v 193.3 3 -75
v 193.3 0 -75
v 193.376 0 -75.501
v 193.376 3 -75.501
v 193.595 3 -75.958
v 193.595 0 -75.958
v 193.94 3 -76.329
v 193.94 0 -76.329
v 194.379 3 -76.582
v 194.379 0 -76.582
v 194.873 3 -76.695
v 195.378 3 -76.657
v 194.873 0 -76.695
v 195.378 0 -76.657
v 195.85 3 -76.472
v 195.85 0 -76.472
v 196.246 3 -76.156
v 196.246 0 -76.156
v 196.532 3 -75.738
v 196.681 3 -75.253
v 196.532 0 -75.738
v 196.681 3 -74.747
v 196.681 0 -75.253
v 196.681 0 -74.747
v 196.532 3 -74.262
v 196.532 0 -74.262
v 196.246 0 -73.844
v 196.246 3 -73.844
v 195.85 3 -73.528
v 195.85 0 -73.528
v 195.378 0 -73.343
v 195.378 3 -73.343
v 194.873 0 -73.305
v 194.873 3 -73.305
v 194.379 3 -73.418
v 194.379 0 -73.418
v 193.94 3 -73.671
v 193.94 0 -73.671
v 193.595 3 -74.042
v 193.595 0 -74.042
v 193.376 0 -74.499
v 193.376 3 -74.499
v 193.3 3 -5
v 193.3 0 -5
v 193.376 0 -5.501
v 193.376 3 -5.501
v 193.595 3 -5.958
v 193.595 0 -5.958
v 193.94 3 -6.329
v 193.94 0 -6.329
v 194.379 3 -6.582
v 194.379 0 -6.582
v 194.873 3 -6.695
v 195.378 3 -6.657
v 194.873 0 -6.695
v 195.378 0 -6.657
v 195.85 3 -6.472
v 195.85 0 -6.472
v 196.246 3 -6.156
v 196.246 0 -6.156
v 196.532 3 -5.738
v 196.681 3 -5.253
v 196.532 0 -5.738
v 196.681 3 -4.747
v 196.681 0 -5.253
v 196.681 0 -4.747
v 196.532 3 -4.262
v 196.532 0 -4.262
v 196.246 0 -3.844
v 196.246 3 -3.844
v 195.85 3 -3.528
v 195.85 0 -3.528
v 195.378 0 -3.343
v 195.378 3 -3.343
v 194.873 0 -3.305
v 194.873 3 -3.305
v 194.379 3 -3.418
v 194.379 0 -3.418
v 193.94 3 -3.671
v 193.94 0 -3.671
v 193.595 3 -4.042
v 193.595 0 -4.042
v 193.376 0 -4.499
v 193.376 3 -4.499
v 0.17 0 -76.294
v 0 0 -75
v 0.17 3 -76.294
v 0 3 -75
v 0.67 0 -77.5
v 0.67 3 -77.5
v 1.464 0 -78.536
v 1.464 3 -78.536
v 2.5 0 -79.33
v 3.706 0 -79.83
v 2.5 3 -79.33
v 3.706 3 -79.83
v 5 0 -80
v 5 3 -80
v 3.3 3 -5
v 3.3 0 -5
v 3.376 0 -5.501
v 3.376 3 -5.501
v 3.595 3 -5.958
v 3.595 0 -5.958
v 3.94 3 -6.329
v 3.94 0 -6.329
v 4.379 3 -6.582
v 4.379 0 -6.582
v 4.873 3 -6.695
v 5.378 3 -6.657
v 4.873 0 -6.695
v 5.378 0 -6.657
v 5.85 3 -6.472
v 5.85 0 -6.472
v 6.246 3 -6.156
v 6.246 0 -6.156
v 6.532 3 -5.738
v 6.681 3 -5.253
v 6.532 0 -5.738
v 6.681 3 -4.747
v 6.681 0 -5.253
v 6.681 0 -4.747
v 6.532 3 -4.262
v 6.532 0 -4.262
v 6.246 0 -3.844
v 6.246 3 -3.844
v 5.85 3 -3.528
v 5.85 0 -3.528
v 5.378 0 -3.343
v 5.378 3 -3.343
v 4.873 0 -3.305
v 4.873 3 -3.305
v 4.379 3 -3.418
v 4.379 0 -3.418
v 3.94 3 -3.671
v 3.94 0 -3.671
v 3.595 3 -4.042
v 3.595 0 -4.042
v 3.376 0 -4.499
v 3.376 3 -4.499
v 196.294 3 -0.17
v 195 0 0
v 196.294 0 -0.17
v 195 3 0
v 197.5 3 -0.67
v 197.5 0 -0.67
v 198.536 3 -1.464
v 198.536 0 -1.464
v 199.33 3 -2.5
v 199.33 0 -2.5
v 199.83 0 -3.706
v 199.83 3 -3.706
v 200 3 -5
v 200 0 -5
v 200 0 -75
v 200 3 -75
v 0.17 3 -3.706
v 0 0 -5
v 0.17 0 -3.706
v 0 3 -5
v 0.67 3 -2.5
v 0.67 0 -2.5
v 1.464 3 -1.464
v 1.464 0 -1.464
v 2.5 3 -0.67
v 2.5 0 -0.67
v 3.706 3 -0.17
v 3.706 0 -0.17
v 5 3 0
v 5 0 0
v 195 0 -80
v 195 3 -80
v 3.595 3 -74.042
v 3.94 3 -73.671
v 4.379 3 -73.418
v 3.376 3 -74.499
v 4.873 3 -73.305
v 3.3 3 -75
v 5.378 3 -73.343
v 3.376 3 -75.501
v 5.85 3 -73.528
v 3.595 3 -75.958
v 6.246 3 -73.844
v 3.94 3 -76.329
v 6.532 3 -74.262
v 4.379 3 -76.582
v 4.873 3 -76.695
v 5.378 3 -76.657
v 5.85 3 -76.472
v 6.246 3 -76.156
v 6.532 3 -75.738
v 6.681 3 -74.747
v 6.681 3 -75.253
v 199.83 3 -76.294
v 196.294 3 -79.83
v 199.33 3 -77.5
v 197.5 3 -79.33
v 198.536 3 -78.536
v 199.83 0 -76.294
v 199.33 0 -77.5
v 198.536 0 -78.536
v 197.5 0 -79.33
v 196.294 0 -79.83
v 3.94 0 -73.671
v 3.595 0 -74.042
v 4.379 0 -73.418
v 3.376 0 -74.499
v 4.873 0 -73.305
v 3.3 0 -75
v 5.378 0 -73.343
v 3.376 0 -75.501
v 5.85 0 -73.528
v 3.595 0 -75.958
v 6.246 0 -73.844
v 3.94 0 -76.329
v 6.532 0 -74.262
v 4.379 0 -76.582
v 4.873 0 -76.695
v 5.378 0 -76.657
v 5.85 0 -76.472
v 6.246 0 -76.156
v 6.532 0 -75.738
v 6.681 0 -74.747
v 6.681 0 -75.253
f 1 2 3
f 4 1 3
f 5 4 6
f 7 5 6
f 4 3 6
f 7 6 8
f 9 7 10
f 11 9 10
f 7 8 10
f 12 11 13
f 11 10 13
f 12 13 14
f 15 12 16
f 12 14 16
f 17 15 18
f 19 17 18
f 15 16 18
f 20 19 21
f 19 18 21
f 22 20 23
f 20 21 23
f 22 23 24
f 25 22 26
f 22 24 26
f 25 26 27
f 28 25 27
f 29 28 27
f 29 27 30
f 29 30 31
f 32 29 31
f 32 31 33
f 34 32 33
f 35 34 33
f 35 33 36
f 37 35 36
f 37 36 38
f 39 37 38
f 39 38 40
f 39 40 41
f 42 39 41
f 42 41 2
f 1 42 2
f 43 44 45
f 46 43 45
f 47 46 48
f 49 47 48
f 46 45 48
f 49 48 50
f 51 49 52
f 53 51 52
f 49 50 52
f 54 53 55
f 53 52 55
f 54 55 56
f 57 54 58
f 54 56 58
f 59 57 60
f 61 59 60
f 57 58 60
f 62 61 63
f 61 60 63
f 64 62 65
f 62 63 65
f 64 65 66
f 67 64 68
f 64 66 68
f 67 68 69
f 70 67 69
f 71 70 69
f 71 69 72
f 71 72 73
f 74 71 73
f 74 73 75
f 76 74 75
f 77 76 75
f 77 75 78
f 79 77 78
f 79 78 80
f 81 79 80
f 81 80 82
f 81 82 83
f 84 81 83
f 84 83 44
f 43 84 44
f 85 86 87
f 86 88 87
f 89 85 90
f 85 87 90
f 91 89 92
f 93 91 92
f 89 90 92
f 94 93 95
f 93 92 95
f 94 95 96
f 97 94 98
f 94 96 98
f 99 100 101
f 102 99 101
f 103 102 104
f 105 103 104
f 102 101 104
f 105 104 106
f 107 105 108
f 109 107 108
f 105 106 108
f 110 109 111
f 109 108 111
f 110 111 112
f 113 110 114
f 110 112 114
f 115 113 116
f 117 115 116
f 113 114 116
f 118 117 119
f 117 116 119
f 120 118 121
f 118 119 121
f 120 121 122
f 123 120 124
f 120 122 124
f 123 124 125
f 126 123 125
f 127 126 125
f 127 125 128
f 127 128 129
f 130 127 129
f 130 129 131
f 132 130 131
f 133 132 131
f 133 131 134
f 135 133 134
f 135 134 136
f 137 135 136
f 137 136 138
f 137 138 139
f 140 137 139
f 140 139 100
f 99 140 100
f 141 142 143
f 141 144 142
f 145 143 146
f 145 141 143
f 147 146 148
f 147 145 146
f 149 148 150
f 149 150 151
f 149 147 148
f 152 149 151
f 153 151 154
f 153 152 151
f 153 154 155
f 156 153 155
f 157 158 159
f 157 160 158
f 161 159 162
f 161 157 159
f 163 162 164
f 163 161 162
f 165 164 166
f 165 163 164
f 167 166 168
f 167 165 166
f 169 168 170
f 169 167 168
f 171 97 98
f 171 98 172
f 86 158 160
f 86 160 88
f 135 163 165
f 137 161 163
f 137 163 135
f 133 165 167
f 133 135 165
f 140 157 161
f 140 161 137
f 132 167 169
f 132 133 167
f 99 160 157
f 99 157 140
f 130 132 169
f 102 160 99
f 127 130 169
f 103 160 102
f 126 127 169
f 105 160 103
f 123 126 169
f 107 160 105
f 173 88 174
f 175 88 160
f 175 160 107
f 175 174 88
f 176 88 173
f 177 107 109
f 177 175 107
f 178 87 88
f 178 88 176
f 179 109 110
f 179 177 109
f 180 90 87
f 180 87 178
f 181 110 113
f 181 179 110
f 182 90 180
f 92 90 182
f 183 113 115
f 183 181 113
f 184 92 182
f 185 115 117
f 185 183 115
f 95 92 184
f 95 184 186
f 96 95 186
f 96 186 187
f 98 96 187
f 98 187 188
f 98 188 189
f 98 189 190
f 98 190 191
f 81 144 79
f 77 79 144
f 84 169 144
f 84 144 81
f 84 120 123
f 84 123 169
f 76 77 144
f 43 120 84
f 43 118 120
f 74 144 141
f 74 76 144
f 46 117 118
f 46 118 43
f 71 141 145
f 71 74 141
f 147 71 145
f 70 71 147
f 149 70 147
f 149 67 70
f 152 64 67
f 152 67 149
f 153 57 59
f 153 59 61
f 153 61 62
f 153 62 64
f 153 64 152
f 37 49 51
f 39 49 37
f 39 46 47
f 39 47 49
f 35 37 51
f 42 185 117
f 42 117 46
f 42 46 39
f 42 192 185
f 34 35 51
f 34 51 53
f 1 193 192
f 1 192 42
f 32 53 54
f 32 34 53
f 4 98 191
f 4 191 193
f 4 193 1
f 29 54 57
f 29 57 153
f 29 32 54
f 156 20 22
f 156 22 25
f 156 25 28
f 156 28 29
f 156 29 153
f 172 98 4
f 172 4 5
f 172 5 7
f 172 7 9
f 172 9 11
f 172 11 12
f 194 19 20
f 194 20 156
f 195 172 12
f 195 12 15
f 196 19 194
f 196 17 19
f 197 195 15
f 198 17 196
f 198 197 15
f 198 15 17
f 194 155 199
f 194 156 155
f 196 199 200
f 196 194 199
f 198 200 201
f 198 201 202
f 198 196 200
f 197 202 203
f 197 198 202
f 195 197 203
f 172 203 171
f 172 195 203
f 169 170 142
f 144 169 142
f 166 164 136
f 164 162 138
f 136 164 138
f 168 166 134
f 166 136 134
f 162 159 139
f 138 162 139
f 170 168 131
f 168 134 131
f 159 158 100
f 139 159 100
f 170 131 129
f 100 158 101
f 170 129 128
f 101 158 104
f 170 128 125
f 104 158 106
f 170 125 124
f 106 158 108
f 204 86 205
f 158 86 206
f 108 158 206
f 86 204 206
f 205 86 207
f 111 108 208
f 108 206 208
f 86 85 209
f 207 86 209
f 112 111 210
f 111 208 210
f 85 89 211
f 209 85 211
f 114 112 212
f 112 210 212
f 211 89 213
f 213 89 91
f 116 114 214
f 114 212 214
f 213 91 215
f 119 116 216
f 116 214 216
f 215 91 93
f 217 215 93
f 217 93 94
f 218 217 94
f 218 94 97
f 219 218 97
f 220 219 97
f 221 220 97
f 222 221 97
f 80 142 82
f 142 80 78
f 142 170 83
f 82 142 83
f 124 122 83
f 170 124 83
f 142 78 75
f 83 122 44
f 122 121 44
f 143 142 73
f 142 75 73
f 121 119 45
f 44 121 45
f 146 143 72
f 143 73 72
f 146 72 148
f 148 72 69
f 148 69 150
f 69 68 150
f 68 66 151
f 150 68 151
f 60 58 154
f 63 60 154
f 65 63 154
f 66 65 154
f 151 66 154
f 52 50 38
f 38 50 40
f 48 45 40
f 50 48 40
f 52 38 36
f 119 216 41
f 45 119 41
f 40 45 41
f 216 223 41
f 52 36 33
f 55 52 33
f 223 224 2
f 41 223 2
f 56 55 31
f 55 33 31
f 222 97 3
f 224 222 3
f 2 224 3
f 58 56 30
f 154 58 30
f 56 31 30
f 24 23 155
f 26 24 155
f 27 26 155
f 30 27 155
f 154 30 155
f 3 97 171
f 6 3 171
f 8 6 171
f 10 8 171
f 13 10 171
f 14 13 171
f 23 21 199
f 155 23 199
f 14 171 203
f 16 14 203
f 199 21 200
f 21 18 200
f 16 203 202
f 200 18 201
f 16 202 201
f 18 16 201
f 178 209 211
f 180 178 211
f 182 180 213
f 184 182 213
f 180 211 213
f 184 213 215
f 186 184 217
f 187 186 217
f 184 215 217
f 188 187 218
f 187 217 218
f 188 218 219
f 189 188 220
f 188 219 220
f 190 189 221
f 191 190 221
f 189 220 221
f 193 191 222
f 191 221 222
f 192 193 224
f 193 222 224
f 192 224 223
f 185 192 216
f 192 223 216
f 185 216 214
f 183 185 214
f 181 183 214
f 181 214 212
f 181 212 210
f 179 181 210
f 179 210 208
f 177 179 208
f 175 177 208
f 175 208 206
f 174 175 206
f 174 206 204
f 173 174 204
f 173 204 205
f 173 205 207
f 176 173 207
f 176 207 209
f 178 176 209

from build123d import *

# Parameters (mm, degrees)
ESQUISSE1_W             = 200
ESQUISSE1_H             = 80
BOSS_EXTRU_1_DEPTH      = 3
CONG_1_R                = 5
ESQUISSE2_R             = 1
ENL_V_MAT_EXTRU_1_DEPTH = 216.427481998
D_GAGEMENT_M31_D        = 3.4
D_GAGEMENT_M31_DEPTH    = 10
D_GAGEMENT_M31_TIP      = 1.021463052


with BuildPart() as part:
    # Esquisse1 → Boss.-Extru.1 (new body)
    with BuildSketch(Plane(origin=(0, 0, 0), x_dir=(1, 0, 0), z_dir=(0, 1, 0))):
        with Locations((100, 40)):
            Rectangle(ESQUISSE1_W, ESQUISSE1_H)
    extrude(amount=BOSS_EXTRU_1_DEPTH)

    # Congé1
    cong_1_edges = [part.edges().sort_by_distance(p)[0] for p in [
        (0, 1.5, -80),
        (200, 1.5, -80),
        (200, 1.5, 0),
        (0, 1.5, 0),
    ]]
    fillet(cong_1_edges, radius=CONG_1_R)

    # Esquisse2 → Enlèv. mat.-Extru.1 (cut, through all)
    with BuildSketch(Plane(origin=(0, 3, 0), x_dir=(1, 0, 0), z_dir=(0, 1, 0))):
        with Locations(Location((5, 75, 0), (0, 0, 270))):
            Circle(ESQUISSE2_R)
        with Locations(Location((195, 75, 0), (0, 0, 270))):
            Circle(ESQUISSE2_R)
        with Locations(Location((195, 5, 0), (0, 0, 270))):
            Circle(ESQUISSE2_R)
        with Locations(Location((5, 5, 0), (0, 0, 270))):
            Circle(ESQUISSE2_R)
    extrude(amount=-ENL_V_MAT_EXTRU_1_DEPTH, mode=Mode.SUBTRACT)

    # Dégagement M31
    with Locations(Plane(origin=(0, 3, 0), x_dir=(1, 0, 0), z_dir=(0, 1, 0))):
        with Locations((195, 5), (5, 5), (5, 75), (195, 75)):
            Hole(D_GAGEMENT_M31_D / 2, depth=D_GAGEMENT_M31_DEPTH)
            with Locations((0, 0, -(D_GAGEMENT_M31_DEPTH + D_GAGEMENT_M31_TIP / 2))):  # 118° drill point
                Cone(0, D_GAGEMENT_M31_D / 2, D_GAGEMENT_M31_TIP, mode=Mode.SUBTRACT)


solid = part.part
